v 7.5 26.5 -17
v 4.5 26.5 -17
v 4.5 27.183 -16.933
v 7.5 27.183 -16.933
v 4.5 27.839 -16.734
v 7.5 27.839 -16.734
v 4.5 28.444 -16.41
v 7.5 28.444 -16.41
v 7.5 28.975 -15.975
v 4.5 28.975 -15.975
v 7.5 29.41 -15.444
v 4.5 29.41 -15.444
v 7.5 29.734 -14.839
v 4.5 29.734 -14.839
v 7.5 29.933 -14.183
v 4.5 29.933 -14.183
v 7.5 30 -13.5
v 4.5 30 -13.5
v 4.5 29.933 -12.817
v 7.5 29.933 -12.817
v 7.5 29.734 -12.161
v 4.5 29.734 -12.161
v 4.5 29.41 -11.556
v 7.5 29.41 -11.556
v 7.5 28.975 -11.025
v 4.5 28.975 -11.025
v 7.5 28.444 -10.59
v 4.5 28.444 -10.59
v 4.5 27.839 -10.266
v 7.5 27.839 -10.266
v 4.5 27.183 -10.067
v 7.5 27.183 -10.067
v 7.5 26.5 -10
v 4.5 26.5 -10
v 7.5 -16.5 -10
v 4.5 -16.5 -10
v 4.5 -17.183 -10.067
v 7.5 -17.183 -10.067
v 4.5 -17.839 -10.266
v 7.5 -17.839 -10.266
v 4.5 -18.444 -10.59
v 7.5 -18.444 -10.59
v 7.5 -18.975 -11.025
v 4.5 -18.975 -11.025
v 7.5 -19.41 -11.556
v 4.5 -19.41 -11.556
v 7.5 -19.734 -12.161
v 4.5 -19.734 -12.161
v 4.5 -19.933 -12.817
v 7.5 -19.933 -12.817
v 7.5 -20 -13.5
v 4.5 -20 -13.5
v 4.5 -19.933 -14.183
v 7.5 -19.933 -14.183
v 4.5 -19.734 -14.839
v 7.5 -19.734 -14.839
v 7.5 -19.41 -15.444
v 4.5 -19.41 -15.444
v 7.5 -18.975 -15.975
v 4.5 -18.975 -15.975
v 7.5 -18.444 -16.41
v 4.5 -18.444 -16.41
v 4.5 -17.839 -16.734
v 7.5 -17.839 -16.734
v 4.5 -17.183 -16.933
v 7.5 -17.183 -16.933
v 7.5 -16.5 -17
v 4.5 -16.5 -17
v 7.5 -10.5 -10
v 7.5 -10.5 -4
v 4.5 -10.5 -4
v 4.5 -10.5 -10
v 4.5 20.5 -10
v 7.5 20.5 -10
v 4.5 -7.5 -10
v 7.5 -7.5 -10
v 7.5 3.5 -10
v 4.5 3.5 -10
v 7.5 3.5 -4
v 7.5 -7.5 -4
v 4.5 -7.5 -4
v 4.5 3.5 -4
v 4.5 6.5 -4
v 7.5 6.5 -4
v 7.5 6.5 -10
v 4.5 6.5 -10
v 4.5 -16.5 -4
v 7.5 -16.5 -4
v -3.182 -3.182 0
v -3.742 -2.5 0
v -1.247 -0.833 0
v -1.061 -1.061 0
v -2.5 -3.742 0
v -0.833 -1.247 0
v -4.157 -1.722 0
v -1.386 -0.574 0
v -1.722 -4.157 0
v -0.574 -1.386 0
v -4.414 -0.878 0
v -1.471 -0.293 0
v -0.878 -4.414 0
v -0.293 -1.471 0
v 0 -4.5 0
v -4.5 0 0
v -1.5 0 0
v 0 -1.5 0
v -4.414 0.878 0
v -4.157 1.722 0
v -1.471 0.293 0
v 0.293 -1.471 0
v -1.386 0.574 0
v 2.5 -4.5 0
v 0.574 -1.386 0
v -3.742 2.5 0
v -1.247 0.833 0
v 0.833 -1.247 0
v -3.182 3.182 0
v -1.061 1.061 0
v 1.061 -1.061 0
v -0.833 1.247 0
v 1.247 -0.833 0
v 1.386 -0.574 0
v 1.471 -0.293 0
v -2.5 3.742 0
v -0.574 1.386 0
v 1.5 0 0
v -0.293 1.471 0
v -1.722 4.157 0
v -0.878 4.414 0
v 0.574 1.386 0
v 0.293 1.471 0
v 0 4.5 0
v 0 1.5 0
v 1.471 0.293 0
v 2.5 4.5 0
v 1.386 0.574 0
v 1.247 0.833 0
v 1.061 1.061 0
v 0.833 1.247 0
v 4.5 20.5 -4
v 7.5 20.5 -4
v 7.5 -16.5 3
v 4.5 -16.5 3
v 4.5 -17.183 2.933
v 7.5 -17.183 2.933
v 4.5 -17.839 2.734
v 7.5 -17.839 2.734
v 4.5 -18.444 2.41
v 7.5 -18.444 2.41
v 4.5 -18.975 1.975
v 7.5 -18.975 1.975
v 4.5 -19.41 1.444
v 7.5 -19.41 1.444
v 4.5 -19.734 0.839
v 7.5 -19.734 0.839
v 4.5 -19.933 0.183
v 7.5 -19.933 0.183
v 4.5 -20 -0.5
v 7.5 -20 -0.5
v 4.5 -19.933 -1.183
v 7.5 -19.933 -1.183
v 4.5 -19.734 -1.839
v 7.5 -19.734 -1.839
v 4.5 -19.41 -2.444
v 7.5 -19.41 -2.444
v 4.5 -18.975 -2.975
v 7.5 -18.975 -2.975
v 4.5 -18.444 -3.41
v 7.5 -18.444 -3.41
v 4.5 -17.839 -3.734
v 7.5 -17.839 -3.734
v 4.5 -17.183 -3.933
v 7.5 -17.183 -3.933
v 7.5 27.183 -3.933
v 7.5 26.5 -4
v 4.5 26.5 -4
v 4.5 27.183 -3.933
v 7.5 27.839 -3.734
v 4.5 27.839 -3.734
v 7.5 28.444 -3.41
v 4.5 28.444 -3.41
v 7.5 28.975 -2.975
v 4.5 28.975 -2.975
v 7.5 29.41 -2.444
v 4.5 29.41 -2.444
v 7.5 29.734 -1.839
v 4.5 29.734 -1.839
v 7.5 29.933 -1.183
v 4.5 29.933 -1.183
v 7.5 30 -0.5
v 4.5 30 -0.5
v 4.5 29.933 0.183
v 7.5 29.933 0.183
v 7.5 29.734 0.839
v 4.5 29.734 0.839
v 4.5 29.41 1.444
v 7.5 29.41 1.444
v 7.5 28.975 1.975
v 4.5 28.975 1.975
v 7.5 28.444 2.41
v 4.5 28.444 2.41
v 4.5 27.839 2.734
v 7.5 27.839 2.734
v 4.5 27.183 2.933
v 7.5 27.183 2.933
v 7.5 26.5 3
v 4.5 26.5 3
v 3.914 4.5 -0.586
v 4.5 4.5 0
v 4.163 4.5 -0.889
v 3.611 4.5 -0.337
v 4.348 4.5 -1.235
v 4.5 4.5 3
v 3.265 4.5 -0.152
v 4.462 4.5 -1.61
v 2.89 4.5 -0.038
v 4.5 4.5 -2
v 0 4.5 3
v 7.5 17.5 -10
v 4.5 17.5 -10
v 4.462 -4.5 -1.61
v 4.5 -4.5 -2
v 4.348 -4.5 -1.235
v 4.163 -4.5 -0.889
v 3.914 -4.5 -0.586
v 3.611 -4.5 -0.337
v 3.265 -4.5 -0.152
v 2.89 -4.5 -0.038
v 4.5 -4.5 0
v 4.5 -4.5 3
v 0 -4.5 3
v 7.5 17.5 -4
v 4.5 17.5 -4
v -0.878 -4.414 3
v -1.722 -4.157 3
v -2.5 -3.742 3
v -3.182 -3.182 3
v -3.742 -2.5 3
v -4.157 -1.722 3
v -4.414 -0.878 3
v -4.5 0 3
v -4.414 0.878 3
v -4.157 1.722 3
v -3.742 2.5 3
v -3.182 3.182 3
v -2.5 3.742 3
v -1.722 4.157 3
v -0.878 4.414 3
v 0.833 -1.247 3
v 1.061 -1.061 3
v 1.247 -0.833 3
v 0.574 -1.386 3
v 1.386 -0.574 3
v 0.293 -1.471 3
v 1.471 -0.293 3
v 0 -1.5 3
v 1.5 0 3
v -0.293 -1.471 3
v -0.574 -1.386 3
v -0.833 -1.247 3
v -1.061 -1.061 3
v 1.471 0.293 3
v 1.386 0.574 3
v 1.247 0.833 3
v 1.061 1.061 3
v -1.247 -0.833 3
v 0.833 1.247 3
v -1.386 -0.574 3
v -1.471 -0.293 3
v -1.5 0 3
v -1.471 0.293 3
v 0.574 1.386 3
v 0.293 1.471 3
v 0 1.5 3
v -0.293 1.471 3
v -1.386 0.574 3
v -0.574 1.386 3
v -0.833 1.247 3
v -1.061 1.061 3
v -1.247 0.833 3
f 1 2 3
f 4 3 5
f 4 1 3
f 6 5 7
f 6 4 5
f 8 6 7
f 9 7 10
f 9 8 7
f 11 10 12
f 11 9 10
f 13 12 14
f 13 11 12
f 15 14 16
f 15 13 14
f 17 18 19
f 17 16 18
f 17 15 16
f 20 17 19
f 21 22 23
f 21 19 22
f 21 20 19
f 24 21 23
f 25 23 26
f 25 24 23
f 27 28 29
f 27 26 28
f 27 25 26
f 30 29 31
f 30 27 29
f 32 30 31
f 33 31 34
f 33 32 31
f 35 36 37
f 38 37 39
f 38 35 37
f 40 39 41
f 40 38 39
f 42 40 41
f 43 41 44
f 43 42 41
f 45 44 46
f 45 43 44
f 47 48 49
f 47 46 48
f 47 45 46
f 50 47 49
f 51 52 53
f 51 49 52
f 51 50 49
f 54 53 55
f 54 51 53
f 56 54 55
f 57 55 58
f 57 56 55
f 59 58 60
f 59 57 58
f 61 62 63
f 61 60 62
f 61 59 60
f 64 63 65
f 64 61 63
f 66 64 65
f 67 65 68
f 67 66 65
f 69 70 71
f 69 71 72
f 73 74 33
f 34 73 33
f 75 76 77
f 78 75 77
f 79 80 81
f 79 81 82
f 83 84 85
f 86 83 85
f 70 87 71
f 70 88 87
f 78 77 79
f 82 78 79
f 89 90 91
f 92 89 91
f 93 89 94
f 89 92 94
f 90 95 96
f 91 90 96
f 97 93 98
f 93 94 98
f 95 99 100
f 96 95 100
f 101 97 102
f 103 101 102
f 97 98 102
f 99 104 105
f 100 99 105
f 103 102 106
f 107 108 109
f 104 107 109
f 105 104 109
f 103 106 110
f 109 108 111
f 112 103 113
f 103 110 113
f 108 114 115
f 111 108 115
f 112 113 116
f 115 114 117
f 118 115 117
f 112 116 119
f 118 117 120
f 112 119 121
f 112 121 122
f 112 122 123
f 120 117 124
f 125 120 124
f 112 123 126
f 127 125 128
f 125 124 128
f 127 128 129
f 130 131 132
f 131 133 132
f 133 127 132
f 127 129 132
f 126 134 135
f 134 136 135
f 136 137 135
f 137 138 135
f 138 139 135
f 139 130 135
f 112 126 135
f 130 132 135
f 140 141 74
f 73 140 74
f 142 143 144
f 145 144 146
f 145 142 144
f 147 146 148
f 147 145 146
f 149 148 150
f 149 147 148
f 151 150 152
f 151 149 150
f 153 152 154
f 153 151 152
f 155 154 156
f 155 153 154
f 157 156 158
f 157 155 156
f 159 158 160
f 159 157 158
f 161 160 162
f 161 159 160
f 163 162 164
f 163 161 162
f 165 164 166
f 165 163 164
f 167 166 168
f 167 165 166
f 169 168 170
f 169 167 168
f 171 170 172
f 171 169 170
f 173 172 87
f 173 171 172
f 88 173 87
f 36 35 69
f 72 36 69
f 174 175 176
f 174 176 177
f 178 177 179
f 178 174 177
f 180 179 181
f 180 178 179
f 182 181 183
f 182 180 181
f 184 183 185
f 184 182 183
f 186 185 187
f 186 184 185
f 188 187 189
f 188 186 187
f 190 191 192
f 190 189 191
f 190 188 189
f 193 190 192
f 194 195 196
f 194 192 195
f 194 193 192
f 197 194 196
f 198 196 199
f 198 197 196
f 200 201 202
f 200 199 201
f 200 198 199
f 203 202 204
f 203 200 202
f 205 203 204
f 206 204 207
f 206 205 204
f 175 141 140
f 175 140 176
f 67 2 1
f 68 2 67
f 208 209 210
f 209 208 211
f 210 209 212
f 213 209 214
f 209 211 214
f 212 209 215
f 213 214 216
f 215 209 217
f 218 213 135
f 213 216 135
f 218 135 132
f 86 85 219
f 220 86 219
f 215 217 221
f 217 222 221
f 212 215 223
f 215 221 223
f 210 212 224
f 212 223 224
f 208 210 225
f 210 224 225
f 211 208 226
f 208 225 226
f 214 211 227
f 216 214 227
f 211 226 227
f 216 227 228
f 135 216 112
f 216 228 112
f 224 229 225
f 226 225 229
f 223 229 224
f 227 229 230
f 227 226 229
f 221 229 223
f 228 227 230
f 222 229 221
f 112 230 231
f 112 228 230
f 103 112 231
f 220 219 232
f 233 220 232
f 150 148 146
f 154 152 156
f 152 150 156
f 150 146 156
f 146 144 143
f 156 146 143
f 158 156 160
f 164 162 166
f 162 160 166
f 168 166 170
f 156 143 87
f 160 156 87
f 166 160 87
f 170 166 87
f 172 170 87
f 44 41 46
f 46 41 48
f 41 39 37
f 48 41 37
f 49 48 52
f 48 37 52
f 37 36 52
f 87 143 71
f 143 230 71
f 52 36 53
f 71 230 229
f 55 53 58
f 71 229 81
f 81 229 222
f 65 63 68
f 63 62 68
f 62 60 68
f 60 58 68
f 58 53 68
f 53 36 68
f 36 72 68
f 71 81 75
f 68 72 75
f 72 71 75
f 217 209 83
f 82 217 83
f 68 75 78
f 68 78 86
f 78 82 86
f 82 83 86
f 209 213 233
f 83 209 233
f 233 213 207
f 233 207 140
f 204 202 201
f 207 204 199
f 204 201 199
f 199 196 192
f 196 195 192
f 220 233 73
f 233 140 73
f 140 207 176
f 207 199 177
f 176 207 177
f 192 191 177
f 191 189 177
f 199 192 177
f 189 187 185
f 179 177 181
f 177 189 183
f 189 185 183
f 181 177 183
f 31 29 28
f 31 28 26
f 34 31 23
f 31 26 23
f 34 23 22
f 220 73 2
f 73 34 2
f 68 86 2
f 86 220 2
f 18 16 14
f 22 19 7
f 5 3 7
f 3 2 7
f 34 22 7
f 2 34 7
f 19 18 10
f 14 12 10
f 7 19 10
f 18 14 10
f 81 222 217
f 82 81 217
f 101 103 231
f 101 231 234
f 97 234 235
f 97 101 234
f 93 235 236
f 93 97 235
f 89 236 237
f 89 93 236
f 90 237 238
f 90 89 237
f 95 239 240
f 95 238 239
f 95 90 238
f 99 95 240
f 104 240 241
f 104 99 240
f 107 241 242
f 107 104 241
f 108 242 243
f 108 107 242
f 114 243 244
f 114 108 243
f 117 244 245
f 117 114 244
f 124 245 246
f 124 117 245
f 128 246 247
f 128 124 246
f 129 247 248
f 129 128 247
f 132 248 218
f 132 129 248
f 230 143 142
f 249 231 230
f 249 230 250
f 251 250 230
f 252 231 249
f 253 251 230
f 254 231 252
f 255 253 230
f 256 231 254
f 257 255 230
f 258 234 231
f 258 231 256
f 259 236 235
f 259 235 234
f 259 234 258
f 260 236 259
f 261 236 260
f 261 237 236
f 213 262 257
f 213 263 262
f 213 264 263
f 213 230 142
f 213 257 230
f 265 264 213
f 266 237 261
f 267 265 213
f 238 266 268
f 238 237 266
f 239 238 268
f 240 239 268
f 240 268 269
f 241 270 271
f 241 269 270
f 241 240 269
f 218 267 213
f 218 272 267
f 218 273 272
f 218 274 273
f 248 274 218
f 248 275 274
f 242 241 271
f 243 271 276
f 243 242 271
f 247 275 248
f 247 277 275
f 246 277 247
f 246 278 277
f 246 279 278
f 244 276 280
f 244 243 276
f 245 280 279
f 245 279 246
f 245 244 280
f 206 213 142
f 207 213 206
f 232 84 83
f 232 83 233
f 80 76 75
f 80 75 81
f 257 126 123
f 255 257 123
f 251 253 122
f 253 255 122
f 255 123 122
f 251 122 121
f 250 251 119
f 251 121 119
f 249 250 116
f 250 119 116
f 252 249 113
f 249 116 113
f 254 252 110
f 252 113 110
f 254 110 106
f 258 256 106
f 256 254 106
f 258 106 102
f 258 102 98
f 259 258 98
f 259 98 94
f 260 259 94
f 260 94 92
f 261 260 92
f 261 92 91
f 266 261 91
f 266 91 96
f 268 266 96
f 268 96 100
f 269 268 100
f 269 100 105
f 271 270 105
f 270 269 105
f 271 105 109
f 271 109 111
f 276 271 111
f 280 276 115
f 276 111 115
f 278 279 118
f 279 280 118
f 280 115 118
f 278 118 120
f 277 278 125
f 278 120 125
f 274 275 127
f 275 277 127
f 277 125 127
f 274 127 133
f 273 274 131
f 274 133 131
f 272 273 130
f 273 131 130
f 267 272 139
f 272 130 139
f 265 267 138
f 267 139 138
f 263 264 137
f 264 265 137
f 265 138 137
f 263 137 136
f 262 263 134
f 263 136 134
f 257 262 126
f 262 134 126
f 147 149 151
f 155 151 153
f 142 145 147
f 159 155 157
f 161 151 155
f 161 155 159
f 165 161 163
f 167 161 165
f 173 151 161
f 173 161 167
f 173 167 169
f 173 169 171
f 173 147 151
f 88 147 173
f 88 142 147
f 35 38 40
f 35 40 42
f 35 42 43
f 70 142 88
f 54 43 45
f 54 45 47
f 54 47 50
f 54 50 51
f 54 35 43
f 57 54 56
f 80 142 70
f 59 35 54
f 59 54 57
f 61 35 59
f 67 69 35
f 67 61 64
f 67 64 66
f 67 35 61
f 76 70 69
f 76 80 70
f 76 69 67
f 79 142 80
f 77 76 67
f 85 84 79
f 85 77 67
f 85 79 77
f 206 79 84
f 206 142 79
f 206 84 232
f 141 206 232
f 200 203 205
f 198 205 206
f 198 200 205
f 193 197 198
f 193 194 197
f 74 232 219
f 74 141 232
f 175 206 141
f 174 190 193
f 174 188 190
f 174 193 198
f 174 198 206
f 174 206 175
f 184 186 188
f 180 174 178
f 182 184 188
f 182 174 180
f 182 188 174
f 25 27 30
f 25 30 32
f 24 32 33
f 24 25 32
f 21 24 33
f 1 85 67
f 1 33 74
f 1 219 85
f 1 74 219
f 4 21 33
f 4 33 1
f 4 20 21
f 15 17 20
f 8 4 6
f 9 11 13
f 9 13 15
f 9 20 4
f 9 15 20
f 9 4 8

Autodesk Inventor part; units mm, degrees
ref_plane "YZ Plane" through (0, 0, 0) normal (1, 0, 0) x (0, 1, 0)
ref_plane "XZ Plane" through (0, 0, 0) normal (0, 1, 0) x (-1, 0, 0)
ref_plane "XY Plane" through (0, 0, 0) normal (0, 0, 1) x (1, 0, 0)
sketch "Sketch1" plane through (0, 0, 0) normal (0, 0, 1) x (1, 0, 0)
  circle A0 centre (0, 0) radius 1.5
  circle A1 centre (0, 0) radius 4.5
  line L0 (4.5, 0) -> (4.5, 4.5)
  line L1 (4.5, 4.5) -> (0, 4.5)
  line L2 (4.5, 0) -> (4.5, -4.5)
  line L3 (4.5, -4.5) -> (0, -4.5)
  dimension "d0" = 3
  dimension "d1" = 9
extrude "Extrusion1" add sketch "Sketch1" along normal blind 3
sketch "Sketch2" plane through (4.5, -4.5, 0) normal (1, 0, 0) x (0, 0, -1)
  line L0 (0, 0) -> (0, 9) projected
  line L1 (0, 9) -> (-3, 9) projected
  line L2 (-3, 0) -> (-3, 9) projected
  line L3 (0, 0) -> (-3, 0) projected
  line L4 (-3, 9) -> (-3, 0) projected
  line L5 (-3, 0) -> (-3, 4.5)
  line L6 (-3, 4.5) -> (-3, 34.5)
  line L7 (-3, 34.5) -> (17, 34.5)
  line L8 (17, 34.5) -> (17, -15.5)
  line L9 (17, -15.5) -> (-3, -15.5)
  line L10 (-3, -15.5) -> (-3, 4.5)
  point P0 (0, 4.5)
  dimension "d4" = 4.5
  dimension "d5" = 30
  dimension "d6" = 20
  dimension "d7" = 50
extrude "Extrusion2" add sketch "Sketch2" along normal blind 3
sketch "Sketch3" plane through (7.5, -4.5, 0) normal (1, 0, 0) x (0, 0, -1)
  line L0 (-3, -15.5) -> (17, -15.5) projected
  line L1 (17, -15.5) -> (17, 34.5) projected
  line L2 (17, 34.5) -> (-3, 34.5) projected
  line L3 (-3, 34.5) -> (-3, -15.5) projected
  line L4 (-3, 0) -> (-3, -15.5) projected
  line L5 (-3, -15.5) -> (0, -15.5)
  line L6 (-3, -15.5) -> (17, -15.5) projected
  line L7 (0, -15.5) -> (0, 34.5)
  line L8 (17, -15.5) -> (14, -15.5)
  line L9 (14, -15.5) -> (14, 34.5)
  line L10 (17, 34.5) -> (-3, 34.5) projected
  line L11 (0, -15.5) -> (0, 9.5)
  line L12 (0, 9.5) -> (0, 11)
  line L13 (0, 11) -> (14, 11)
  line L14 (14, 11) -> (14, 8)
  line L15 (14, 8) -> (0, 8)
  line L16 (0, 8) -> (0, 9.5)
  line L17 (0, 9.5) -> (0, -4.5)
  line L18 (0, -4.5) -> (0, -6)
  line L19 (0, -6) -> (14, -6)
  line L20 (14, -6) -> (14, -3)
  line L21 (14, -3) -> (0, -3)
  line L22 (0, 9.5) -> (0, 23.5)
  line L23 (0, 23.5) -> (0, 25)
  line L24 (0, 25) -> (14, 25)
  line L25 (14, 25) -> (14, 22)
  line L26 (14, 22) -> (0, 22)
  line L27 (0, -15.5) -> (4, -15.5)
  line L28 (4, -15.5) -> (4, 34.5)
  line L29 (14, -15.5) -> (10, -15.5)
  line L30 (10, -15.5) -> (10, 34.5)
  point P0 (0, 4.5)
  point P1 (10, -6)
  point P2 (4, -6)
  point P3 (10, -3)
  point P4 (10, 8)
  point P5 (4, 8)
  point P6 (4, -3)
  point P7 (10, 11)
  point P8 (10, 22)
  point P9 (4, 22)
  point P10 (4, 11)
  point P11 (10, 25)
  point P12 (4, 25)
  dimension "d10" = 3
  dimension "d11" = 3
  dimension "d12" = 25
  dimension "d13" = 1.5
  dimension "d14" = 3
  dimension "d15" = 14
  dimension "d16" = 1.5
  dimension "d17" = 3
  dimension "d18" = 14
  dimension "d19" = 1.5
  dimension "d20" = 3
  dimension "d21" = 4
  dimension "d22" = 4
extrude "Extrusion3" cut sketch "Sketch3" against normal blind 3 contours L28 L19 L30 L0 | L28 L15 L30 L21 | L2 L30 L24 L28 | L28 L26 L30 L13
sketch "Sketch4" plane through (7.5, -4.5, 0) normal (1, 0, 0) x (0, 0, -1)
  line L0 (10, -6) -> (10, -15.5) projected
  line L1 (10, -15.5) -> (17, -15.5) projected
  line L2 (17, -15.5) -> (17, 34.5) projected
  line L3 (17, 34.5) -> (10, 34.5) projected
  line L4 (10, 34.5) -> (10, 25) projected
  line L5 (10, 25) -> (4, 25) projected
  line L6 (4, 25) -> (4, 34.5) projected
  line L7 (4, 34.5) -> (-3, 34.5) projected
  line L8 (-3, 34.5) -> (-3, -15.5) projected
  line L9 (-3, -15.5) -> (4, -15.5) projected
  line L10 (4, -15.5) -> (4, -6) projected
  line L11 (4, -6) -> (10, -6) projected
  line L12 (4, -3) -> (4, 8) projected
  line L13 (4, 8) -> (10, 8) projected
  line L14 (10, 8) -> (10, -3) projected
  line L15 (10, -3) -> (4, -3) projected
  line L16 (4, 11) -> (4, 22) projected
  line L17 (4, 22) -> (10, 22) projected
  line L18 (10, 22) -> (10, 11) projected
  line L19 (10, 11) -> (4, 11) projected
  line L20 (-3, -15.5) -> (0.5, -15.5)
  line L21 (-3, -15.5) -> (4, -15.5) projected
  line L22 (0.5, -15.5) -> (0.5, -12)
  circle A0 centre (0.5, -12) radius 3.5
  line L23 (-3, -15.5) -> (-3, 9.5)
  line L24 (-3, 34.5) -> (-3, -15.5) projected
  line L25 (-3, 9.5) -> (5.4894, 9.5)
  circle A1 centre (0.5, 31) radius 3.5
  line L26 (-3, 9.5) -> (7, 9.5)
  line L27 (7, 9.5) -> (7, 17.879)
  circle A2 centre (13.5, -12) radius 3.5
  circle A3 centre (13.5, 31) radius 3.5
  point P0 (0, 4.5)
  point P1 (-3, 31)
  point P2 (0.5, 34.5)
  point P3 (4, 31)
  point P4 (10, 31)
  point P5 (13.5, 34.5)
  point P6 (17, 31)
  point P7 (17, -12)
  point P8 (13.5, -15.5)
  point P9 (10, -12)
  point P10 (-3, -12)
  point P11 (4, -12)
  dimension "d25" = 3.5
  dimension "d26" = 3.5
  dimension "d27" = 25
extrude "Extrusion4" cut sketch "Sketch4" against normal blind 3 contours A2 L1 L0 | L2 L1 A2 | L10 L9 A0 | A3 L3 L2 | L9 L8 A0 | A3 L4 L3 | L8 L7 A1 | L7 L6 A1
fillet "Fillet1" radius 2 1 edges at (4.5, 0, 0)
properties part number "agarre_izquierda"
